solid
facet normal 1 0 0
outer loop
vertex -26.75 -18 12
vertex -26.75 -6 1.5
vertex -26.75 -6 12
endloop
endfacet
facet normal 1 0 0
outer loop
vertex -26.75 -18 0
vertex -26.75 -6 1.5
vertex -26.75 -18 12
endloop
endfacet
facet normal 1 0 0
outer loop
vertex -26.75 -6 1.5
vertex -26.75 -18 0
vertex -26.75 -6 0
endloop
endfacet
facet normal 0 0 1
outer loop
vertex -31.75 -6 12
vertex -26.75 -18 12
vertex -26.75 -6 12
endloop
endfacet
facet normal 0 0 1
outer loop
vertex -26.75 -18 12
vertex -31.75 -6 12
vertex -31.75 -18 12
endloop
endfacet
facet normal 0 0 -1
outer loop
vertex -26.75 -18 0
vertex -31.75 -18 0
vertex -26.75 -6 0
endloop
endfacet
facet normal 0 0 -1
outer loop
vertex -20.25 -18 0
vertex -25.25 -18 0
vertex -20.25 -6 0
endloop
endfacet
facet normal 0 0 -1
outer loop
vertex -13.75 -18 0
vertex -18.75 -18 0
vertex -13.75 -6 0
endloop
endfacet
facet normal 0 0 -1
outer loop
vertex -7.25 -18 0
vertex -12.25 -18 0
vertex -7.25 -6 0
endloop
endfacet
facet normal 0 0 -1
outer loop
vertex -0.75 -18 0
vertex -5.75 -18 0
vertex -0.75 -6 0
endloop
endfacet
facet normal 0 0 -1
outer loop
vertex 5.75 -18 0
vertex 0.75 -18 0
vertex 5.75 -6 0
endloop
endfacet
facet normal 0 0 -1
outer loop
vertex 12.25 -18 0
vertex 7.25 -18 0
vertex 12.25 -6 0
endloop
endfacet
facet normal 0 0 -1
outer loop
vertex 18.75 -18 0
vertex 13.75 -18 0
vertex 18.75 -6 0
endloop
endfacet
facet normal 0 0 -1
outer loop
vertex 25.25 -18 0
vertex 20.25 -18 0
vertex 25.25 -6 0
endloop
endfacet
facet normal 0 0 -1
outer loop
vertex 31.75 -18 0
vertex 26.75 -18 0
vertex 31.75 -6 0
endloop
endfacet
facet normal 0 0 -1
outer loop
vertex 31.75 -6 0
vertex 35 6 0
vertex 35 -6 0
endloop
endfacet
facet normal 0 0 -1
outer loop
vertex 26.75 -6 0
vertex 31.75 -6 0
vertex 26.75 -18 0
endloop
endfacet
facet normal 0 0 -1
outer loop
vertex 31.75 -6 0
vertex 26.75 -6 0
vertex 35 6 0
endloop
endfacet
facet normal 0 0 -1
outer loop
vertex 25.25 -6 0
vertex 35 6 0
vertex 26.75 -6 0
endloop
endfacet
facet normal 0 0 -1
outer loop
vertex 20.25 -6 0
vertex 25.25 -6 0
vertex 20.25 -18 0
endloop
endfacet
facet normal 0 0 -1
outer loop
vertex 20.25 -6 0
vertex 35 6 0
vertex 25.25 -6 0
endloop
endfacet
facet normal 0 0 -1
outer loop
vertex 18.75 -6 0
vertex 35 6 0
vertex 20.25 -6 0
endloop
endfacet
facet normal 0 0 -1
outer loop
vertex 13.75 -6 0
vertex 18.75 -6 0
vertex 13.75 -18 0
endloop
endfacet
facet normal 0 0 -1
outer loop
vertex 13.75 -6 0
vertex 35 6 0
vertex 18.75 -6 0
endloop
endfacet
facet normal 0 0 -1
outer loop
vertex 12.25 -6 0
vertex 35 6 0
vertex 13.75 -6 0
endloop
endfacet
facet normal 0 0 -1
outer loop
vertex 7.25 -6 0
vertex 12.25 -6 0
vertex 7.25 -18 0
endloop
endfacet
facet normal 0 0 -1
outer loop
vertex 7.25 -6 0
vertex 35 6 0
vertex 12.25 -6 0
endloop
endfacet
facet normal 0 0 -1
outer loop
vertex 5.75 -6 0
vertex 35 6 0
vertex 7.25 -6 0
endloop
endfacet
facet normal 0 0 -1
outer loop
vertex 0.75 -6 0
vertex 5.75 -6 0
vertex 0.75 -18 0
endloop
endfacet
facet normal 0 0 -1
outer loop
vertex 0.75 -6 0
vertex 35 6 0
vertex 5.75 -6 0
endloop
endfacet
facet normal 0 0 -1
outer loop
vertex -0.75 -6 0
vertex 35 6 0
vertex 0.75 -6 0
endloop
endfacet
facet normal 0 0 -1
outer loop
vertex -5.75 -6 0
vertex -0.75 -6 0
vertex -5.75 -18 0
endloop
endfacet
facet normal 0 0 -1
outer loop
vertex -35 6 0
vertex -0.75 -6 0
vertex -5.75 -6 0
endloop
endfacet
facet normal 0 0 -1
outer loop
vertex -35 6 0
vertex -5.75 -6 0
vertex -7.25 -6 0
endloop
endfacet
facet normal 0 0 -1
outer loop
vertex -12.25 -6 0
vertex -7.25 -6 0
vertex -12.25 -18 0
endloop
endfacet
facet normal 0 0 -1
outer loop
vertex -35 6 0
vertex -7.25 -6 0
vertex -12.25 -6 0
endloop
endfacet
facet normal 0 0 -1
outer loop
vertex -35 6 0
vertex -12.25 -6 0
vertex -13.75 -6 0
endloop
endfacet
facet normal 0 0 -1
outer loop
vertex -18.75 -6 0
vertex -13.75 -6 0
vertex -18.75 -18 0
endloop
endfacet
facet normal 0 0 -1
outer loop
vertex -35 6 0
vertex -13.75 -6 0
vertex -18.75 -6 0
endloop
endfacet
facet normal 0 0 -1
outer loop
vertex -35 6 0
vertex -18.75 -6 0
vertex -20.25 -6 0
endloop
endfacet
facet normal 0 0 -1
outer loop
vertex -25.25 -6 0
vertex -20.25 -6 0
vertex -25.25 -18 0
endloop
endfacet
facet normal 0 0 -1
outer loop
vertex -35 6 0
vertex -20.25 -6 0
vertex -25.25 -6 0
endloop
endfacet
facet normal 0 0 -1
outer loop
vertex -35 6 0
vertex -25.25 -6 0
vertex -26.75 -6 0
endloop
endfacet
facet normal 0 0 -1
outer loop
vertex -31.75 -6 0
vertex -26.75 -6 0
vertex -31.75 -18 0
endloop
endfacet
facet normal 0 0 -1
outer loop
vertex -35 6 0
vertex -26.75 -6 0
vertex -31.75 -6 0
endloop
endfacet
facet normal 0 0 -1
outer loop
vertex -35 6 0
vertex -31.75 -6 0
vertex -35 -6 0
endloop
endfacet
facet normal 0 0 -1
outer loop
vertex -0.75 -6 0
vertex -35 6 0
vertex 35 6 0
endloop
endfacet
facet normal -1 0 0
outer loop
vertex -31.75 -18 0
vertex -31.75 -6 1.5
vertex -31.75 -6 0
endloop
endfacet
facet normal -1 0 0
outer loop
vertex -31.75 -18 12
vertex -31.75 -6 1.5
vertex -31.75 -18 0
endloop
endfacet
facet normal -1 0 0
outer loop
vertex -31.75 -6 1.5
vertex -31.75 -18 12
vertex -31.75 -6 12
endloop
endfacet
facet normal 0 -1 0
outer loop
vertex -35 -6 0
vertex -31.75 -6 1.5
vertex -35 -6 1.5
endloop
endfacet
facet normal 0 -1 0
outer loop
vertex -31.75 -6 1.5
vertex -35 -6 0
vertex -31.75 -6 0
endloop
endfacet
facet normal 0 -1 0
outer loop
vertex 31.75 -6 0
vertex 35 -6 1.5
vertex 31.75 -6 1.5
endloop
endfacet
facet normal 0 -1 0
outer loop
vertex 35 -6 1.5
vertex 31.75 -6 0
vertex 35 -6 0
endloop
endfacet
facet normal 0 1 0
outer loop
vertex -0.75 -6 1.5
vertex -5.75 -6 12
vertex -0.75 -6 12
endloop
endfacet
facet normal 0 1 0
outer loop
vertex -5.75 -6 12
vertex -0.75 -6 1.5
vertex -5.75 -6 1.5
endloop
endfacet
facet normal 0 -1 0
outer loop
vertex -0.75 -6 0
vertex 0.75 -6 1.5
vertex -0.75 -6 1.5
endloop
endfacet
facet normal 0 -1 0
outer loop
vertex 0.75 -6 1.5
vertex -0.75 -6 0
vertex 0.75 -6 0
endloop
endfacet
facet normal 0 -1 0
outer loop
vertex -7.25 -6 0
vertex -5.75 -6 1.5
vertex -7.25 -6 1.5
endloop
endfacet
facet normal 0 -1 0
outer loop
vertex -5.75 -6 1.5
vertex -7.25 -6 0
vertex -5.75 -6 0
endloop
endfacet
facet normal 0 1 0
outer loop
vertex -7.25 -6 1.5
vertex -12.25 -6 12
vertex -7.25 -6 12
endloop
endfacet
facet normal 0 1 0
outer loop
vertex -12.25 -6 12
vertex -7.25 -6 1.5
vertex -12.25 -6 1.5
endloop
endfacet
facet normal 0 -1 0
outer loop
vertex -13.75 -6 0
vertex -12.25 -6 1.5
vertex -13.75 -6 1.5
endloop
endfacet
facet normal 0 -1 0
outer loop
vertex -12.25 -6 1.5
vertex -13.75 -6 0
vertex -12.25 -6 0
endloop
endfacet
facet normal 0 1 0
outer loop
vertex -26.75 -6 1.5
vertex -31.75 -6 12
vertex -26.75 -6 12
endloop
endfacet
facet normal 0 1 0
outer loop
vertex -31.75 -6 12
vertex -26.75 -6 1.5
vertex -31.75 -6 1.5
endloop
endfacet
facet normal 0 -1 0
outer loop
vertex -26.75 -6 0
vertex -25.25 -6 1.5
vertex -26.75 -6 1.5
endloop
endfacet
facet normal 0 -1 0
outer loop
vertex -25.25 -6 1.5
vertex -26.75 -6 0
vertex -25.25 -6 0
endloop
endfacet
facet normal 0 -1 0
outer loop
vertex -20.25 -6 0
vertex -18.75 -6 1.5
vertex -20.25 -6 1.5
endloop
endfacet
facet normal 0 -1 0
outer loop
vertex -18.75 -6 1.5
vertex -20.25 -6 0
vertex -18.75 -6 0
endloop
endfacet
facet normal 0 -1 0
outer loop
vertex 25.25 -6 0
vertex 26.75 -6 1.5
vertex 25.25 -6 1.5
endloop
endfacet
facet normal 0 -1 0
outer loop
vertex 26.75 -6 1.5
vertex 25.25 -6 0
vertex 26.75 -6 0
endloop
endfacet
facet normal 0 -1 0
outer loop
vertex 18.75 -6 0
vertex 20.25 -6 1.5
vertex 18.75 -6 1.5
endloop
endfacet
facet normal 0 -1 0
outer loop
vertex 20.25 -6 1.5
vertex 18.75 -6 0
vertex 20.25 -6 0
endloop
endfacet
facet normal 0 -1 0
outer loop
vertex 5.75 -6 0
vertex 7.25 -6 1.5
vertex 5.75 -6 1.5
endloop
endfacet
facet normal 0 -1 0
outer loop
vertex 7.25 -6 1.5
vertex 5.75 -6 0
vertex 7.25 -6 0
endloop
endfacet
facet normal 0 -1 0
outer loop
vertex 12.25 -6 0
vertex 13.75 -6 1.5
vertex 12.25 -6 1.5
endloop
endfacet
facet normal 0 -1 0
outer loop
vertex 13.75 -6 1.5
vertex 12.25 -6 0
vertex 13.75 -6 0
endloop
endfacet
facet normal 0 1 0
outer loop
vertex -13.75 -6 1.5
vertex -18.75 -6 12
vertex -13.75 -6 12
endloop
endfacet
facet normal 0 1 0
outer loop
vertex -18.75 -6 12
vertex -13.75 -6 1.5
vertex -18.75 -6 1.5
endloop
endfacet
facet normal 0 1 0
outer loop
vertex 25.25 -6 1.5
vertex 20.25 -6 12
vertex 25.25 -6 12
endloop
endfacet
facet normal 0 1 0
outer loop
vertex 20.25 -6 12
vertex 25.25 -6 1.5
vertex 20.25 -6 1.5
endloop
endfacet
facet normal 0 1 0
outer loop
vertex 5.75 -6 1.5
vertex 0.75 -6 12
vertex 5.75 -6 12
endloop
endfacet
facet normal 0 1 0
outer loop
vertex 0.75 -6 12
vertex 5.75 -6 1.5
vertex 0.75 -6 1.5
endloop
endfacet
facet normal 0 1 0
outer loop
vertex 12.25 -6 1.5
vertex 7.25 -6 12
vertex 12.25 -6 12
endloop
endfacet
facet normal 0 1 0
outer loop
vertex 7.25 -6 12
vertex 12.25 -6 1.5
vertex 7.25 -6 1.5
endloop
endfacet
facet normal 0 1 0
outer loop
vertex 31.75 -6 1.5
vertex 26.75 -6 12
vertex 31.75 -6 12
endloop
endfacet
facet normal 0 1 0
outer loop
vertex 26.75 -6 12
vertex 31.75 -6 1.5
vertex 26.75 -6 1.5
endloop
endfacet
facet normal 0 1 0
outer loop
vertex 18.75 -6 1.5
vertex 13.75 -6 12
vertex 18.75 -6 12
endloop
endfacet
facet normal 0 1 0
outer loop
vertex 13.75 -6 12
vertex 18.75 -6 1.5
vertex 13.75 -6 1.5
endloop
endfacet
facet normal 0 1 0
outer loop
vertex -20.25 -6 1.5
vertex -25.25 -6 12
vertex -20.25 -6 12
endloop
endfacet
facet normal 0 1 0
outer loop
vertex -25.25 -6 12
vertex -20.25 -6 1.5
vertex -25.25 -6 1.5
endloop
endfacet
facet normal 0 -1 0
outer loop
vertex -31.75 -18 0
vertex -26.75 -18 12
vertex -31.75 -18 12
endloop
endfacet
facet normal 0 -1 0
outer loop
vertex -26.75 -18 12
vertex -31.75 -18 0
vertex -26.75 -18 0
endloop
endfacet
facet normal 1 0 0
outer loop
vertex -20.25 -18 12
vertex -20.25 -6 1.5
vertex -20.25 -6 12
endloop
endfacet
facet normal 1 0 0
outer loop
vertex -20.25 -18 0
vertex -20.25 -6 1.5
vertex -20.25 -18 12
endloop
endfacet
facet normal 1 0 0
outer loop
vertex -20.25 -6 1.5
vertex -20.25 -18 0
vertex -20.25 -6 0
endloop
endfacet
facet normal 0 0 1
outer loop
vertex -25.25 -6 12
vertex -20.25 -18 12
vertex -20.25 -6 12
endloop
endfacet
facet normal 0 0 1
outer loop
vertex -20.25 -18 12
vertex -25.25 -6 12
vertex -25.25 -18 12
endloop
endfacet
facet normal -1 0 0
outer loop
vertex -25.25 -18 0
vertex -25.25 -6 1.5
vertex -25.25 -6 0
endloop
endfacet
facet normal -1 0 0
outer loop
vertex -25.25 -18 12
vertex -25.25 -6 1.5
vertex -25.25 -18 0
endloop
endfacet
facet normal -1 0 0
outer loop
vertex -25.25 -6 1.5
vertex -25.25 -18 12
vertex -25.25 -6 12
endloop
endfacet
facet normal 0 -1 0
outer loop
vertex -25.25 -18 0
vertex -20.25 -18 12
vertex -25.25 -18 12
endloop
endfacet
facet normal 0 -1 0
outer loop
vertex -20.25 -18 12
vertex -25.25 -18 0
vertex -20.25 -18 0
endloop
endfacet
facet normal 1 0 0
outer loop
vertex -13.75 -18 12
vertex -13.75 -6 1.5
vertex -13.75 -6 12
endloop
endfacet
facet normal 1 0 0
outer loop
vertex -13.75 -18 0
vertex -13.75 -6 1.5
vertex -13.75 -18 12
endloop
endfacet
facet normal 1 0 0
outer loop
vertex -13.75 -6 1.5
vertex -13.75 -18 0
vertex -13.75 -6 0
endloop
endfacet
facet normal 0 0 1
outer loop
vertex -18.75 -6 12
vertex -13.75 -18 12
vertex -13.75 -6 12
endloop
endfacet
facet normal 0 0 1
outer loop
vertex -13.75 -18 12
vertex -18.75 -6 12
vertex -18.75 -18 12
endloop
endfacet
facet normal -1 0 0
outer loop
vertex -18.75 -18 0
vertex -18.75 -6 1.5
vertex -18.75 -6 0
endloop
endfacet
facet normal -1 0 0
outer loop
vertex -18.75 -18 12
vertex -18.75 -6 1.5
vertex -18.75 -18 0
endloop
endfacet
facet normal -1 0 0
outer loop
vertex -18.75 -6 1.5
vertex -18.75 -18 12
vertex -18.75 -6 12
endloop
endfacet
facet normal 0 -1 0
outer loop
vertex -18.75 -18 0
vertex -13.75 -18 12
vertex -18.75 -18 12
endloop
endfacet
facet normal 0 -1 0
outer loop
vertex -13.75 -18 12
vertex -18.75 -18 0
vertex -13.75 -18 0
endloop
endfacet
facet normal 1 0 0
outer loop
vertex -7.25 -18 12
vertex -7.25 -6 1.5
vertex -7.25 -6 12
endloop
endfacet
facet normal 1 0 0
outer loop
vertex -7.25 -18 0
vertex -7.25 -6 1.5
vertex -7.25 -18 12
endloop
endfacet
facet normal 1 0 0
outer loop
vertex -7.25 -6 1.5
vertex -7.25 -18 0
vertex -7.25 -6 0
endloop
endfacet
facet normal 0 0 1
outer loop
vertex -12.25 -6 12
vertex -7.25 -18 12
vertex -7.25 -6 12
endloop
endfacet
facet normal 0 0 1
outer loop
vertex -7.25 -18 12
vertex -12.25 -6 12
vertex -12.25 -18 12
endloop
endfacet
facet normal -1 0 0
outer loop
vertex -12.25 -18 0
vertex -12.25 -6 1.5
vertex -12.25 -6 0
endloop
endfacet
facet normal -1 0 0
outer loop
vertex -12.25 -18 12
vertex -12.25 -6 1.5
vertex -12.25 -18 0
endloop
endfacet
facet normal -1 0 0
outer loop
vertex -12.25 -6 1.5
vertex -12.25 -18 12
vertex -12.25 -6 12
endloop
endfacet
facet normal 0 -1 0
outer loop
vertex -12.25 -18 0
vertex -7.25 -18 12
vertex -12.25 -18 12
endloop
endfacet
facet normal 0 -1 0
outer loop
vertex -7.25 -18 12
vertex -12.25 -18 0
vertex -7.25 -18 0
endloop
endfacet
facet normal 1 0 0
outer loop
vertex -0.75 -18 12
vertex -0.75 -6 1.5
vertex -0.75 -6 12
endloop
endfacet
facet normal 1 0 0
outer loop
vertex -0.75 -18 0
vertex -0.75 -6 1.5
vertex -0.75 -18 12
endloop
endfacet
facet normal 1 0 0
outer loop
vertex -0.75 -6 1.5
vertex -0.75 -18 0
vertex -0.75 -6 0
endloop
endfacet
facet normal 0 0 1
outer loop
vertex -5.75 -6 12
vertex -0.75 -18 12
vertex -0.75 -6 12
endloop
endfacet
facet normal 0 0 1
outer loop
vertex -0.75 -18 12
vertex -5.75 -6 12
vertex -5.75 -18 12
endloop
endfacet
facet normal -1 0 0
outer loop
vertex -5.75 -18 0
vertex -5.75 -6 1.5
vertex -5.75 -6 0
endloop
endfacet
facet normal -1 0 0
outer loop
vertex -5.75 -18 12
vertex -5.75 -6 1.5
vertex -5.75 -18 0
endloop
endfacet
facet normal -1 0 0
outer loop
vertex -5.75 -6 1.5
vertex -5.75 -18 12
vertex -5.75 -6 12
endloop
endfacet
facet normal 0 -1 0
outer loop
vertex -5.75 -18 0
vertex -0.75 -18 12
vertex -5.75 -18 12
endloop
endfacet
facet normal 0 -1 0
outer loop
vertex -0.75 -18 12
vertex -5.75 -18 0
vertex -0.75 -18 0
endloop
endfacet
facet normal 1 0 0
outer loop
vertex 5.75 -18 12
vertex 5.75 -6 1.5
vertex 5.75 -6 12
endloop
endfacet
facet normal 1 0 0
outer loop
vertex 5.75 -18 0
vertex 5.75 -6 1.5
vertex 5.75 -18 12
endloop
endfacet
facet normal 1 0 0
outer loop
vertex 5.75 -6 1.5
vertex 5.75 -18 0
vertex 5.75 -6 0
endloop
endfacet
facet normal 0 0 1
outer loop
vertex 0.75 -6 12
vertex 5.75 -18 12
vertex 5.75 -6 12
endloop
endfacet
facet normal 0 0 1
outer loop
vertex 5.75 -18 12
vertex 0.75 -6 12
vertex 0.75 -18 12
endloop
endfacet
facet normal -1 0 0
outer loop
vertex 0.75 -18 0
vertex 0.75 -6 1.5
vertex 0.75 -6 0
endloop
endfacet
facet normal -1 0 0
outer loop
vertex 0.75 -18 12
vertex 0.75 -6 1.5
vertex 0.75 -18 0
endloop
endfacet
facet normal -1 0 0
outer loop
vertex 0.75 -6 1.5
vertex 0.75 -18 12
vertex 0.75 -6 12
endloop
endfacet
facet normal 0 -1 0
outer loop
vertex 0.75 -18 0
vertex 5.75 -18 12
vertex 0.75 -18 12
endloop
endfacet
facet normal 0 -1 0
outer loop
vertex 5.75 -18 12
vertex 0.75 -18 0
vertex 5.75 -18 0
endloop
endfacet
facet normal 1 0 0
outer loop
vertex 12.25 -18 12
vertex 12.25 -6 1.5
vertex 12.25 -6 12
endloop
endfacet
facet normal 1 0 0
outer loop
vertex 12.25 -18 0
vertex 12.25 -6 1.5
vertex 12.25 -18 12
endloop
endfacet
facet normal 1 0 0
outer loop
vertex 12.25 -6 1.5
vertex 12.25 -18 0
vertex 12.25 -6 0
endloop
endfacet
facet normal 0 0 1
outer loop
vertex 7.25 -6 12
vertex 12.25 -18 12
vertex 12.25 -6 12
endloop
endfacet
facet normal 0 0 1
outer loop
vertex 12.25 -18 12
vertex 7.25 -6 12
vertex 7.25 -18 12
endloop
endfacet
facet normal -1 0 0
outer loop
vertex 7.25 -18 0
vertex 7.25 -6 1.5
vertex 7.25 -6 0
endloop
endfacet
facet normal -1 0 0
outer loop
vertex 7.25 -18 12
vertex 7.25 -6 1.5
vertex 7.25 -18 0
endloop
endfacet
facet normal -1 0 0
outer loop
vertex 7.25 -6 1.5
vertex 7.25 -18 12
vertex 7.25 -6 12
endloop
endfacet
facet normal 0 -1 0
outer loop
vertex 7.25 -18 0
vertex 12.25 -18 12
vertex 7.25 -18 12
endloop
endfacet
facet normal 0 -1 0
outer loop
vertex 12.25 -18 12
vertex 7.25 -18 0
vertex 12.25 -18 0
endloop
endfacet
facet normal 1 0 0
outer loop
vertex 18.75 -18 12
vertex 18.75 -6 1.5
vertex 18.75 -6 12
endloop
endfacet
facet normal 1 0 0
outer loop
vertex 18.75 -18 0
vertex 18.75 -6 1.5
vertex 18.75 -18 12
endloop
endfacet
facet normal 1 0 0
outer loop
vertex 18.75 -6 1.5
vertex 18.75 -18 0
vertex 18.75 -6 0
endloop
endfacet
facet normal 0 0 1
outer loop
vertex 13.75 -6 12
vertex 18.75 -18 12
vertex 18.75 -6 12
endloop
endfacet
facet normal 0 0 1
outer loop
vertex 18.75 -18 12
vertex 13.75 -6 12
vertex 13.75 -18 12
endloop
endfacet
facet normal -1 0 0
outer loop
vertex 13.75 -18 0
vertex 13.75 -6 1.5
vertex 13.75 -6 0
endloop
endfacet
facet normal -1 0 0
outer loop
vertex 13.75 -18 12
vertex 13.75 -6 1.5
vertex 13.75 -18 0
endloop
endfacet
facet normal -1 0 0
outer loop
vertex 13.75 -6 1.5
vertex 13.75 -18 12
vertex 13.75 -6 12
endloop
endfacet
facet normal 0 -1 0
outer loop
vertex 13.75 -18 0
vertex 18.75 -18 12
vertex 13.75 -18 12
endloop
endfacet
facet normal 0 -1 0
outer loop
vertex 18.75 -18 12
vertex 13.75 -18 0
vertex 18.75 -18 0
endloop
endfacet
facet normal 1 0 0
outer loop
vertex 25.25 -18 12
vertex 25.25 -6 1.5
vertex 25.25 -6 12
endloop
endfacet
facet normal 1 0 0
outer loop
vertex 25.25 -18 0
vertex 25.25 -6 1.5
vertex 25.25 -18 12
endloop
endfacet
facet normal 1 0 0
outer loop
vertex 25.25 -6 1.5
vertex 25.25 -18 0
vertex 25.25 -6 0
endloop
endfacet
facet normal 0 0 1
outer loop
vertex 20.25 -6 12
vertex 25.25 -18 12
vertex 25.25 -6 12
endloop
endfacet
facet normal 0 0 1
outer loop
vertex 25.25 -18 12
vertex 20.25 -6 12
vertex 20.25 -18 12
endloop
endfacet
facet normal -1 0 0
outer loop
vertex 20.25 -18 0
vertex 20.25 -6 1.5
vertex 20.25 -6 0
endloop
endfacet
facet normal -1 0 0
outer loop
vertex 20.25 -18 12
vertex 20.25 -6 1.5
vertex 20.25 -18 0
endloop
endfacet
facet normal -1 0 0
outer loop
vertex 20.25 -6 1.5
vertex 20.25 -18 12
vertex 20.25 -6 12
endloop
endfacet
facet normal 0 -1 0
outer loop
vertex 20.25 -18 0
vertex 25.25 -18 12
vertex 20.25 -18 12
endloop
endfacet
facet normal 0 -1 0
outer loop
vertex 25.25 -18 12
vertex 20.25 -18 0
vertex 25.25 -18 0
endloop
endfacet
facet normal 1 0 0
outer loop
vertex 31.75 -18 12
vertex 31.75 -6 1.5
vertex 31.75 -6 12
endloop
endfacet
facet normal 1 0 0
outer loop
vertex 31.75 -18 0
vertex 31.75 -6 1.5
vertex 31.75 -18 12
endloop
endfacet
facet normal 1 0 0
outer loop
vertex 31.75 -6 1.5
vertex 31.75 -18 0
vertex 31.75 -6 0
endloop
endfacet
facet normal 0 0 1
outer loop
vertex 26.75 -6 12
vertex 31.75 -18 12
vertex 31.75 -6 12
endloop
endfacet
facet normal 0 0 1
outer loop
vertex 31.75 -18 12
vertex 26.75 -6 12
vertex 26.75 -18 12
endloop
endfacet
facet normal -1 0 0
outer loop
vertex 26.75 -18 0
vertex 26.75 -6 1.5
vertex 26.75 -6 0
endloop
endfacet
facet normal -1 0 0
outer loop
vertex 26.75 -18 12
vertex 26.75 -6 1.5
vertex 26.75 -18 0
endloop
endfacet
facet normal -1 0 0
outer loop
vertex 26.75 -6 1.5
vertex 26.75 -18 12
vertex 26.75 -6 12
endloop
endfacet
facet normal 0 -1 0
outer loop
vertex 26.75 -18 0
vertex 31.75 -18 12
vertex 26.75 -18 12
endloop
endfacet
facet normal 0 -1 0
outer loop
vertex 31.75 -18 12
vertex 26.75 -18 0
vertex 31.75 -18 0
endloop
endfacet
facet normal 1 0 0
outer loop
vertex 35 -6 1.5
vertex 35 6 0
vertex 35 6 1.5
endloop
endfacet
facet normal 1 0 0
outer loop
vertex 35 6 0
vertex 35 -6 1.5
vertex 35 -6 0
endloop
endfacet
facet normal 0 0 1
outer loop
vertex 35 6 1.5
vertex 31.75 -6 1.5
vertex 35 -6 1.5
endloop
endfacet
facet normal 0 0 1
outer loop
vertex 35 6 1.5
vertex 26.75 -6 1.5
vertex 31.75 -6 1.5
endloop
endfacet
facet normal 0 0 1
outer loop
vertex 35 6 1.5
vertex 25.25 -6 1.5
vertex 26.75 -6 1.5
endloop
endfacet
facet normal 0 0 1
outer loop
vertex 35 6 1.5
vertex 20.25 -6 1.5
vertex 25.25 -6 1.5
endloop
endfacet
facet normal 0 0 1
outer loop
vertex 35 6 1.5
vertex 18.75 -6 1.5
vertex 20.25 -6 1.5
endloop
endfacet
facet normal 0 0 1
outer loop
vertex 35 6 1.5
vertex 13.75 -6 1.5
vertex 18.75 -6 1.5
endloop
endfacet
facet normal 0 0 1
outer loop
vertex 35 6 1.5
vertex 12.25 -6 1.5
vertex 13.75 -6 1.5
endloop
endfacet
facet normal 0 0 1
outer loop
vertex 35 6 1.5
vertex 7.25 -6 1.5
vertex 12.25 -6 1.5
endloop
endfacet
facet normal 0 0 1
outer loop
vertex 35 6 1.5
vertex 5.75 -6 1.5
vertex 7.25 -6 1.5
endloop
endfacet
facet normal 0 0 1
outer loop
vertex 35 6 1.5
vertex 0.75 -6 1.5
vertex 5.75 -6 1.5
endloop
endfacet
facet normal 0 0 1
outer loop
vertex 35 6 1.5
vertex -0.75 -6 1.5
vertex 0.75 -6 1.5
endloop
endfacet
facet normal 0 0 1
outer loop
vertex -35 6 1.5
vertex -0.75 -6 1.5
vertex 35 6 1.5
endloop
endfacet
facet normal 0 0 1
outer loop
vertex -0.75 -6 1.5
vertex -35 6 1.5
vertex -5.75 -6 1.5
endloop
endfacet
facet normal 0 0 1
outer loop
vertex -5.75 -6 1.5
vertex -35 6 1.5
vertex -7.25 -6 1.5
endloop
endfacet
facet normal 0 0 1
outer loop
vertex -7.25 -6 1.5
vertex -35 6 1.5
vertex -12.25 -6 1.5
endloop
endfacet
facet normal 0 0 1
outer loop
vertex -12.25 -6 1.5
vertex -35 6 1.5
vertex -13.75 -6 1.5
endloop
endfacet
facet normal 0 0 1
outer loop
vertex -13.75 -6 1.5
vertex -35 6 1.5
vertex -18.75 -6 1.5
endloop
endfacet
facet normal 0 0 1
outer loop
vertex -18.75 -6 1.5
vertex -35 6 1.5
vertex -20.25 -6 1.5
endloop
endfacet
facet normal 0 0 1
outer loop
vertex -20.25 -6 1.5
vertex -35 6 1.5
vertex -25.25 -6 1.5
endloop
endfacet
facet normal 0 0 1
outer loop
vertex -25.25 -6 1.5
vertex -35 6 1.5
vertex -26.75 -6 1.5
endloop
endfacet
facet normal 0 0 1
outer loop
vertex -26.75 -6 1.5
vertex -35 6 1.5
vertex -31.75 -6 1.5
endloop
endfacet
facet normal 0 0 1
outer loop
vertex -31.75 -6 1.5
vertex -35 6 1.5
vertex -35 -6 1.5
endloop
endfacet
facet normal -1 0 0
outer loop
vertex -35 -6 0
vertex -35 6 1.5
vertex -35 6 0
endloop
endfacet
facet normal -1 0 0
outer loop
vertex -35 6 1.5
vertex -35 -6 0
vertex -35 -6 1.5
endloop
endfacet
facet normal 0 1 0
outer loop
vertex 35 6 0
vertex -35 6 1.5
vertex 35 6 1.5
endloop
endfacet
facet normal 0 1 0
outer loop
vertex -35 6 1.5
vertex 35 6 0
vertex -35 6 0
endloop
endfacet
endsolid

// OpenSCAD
// 10-well agarose gel comb, printed lying flat
// Units: mm

// ---- Spine ----
spine_len   = 70;   // spine length (X)
spine_wid   = 12;   // spine width (Y)
plate_thk   = 1.5;  // plate thickness (Z)

// ---- Teeth ----
tooth_count = 10;   // number of teeth
tooth_w     = 5.0;  // tooth width (X)
tooth_l     = 12;   // tooth length (Y)
tooth_h     = 12;   // tooth height from spine (Z)

// ---- Gaps ----
gap         = 1.5;  // gap between neighbouring teeth (X)

// ---- Derived ----
pitch       = tooth_w + gap;              // centre-to-centre spacing
x_start     = -(tooth_count - 1) * pitch / 2; // first tooth centre (row centred on spine)
eps         = 0.5;  // cutter overshoot past faces

union() {
    // Spine (back bar)
    translate([-spine_len / 2, -spine_wid / 2, 0])
        cube([spine_len, spine_wid, plate_thk]);

    // Teeth, hanging in -Y direction
    for (i = [0 : tooth_count - 1]) {
        translate([x_start + i * pitch - tooth_w / 2,
                   -spine_wid / 2 - tooth_l,
                   0])
            cube([tooth_w, tooth_l, tooth_h]);
    }
}
